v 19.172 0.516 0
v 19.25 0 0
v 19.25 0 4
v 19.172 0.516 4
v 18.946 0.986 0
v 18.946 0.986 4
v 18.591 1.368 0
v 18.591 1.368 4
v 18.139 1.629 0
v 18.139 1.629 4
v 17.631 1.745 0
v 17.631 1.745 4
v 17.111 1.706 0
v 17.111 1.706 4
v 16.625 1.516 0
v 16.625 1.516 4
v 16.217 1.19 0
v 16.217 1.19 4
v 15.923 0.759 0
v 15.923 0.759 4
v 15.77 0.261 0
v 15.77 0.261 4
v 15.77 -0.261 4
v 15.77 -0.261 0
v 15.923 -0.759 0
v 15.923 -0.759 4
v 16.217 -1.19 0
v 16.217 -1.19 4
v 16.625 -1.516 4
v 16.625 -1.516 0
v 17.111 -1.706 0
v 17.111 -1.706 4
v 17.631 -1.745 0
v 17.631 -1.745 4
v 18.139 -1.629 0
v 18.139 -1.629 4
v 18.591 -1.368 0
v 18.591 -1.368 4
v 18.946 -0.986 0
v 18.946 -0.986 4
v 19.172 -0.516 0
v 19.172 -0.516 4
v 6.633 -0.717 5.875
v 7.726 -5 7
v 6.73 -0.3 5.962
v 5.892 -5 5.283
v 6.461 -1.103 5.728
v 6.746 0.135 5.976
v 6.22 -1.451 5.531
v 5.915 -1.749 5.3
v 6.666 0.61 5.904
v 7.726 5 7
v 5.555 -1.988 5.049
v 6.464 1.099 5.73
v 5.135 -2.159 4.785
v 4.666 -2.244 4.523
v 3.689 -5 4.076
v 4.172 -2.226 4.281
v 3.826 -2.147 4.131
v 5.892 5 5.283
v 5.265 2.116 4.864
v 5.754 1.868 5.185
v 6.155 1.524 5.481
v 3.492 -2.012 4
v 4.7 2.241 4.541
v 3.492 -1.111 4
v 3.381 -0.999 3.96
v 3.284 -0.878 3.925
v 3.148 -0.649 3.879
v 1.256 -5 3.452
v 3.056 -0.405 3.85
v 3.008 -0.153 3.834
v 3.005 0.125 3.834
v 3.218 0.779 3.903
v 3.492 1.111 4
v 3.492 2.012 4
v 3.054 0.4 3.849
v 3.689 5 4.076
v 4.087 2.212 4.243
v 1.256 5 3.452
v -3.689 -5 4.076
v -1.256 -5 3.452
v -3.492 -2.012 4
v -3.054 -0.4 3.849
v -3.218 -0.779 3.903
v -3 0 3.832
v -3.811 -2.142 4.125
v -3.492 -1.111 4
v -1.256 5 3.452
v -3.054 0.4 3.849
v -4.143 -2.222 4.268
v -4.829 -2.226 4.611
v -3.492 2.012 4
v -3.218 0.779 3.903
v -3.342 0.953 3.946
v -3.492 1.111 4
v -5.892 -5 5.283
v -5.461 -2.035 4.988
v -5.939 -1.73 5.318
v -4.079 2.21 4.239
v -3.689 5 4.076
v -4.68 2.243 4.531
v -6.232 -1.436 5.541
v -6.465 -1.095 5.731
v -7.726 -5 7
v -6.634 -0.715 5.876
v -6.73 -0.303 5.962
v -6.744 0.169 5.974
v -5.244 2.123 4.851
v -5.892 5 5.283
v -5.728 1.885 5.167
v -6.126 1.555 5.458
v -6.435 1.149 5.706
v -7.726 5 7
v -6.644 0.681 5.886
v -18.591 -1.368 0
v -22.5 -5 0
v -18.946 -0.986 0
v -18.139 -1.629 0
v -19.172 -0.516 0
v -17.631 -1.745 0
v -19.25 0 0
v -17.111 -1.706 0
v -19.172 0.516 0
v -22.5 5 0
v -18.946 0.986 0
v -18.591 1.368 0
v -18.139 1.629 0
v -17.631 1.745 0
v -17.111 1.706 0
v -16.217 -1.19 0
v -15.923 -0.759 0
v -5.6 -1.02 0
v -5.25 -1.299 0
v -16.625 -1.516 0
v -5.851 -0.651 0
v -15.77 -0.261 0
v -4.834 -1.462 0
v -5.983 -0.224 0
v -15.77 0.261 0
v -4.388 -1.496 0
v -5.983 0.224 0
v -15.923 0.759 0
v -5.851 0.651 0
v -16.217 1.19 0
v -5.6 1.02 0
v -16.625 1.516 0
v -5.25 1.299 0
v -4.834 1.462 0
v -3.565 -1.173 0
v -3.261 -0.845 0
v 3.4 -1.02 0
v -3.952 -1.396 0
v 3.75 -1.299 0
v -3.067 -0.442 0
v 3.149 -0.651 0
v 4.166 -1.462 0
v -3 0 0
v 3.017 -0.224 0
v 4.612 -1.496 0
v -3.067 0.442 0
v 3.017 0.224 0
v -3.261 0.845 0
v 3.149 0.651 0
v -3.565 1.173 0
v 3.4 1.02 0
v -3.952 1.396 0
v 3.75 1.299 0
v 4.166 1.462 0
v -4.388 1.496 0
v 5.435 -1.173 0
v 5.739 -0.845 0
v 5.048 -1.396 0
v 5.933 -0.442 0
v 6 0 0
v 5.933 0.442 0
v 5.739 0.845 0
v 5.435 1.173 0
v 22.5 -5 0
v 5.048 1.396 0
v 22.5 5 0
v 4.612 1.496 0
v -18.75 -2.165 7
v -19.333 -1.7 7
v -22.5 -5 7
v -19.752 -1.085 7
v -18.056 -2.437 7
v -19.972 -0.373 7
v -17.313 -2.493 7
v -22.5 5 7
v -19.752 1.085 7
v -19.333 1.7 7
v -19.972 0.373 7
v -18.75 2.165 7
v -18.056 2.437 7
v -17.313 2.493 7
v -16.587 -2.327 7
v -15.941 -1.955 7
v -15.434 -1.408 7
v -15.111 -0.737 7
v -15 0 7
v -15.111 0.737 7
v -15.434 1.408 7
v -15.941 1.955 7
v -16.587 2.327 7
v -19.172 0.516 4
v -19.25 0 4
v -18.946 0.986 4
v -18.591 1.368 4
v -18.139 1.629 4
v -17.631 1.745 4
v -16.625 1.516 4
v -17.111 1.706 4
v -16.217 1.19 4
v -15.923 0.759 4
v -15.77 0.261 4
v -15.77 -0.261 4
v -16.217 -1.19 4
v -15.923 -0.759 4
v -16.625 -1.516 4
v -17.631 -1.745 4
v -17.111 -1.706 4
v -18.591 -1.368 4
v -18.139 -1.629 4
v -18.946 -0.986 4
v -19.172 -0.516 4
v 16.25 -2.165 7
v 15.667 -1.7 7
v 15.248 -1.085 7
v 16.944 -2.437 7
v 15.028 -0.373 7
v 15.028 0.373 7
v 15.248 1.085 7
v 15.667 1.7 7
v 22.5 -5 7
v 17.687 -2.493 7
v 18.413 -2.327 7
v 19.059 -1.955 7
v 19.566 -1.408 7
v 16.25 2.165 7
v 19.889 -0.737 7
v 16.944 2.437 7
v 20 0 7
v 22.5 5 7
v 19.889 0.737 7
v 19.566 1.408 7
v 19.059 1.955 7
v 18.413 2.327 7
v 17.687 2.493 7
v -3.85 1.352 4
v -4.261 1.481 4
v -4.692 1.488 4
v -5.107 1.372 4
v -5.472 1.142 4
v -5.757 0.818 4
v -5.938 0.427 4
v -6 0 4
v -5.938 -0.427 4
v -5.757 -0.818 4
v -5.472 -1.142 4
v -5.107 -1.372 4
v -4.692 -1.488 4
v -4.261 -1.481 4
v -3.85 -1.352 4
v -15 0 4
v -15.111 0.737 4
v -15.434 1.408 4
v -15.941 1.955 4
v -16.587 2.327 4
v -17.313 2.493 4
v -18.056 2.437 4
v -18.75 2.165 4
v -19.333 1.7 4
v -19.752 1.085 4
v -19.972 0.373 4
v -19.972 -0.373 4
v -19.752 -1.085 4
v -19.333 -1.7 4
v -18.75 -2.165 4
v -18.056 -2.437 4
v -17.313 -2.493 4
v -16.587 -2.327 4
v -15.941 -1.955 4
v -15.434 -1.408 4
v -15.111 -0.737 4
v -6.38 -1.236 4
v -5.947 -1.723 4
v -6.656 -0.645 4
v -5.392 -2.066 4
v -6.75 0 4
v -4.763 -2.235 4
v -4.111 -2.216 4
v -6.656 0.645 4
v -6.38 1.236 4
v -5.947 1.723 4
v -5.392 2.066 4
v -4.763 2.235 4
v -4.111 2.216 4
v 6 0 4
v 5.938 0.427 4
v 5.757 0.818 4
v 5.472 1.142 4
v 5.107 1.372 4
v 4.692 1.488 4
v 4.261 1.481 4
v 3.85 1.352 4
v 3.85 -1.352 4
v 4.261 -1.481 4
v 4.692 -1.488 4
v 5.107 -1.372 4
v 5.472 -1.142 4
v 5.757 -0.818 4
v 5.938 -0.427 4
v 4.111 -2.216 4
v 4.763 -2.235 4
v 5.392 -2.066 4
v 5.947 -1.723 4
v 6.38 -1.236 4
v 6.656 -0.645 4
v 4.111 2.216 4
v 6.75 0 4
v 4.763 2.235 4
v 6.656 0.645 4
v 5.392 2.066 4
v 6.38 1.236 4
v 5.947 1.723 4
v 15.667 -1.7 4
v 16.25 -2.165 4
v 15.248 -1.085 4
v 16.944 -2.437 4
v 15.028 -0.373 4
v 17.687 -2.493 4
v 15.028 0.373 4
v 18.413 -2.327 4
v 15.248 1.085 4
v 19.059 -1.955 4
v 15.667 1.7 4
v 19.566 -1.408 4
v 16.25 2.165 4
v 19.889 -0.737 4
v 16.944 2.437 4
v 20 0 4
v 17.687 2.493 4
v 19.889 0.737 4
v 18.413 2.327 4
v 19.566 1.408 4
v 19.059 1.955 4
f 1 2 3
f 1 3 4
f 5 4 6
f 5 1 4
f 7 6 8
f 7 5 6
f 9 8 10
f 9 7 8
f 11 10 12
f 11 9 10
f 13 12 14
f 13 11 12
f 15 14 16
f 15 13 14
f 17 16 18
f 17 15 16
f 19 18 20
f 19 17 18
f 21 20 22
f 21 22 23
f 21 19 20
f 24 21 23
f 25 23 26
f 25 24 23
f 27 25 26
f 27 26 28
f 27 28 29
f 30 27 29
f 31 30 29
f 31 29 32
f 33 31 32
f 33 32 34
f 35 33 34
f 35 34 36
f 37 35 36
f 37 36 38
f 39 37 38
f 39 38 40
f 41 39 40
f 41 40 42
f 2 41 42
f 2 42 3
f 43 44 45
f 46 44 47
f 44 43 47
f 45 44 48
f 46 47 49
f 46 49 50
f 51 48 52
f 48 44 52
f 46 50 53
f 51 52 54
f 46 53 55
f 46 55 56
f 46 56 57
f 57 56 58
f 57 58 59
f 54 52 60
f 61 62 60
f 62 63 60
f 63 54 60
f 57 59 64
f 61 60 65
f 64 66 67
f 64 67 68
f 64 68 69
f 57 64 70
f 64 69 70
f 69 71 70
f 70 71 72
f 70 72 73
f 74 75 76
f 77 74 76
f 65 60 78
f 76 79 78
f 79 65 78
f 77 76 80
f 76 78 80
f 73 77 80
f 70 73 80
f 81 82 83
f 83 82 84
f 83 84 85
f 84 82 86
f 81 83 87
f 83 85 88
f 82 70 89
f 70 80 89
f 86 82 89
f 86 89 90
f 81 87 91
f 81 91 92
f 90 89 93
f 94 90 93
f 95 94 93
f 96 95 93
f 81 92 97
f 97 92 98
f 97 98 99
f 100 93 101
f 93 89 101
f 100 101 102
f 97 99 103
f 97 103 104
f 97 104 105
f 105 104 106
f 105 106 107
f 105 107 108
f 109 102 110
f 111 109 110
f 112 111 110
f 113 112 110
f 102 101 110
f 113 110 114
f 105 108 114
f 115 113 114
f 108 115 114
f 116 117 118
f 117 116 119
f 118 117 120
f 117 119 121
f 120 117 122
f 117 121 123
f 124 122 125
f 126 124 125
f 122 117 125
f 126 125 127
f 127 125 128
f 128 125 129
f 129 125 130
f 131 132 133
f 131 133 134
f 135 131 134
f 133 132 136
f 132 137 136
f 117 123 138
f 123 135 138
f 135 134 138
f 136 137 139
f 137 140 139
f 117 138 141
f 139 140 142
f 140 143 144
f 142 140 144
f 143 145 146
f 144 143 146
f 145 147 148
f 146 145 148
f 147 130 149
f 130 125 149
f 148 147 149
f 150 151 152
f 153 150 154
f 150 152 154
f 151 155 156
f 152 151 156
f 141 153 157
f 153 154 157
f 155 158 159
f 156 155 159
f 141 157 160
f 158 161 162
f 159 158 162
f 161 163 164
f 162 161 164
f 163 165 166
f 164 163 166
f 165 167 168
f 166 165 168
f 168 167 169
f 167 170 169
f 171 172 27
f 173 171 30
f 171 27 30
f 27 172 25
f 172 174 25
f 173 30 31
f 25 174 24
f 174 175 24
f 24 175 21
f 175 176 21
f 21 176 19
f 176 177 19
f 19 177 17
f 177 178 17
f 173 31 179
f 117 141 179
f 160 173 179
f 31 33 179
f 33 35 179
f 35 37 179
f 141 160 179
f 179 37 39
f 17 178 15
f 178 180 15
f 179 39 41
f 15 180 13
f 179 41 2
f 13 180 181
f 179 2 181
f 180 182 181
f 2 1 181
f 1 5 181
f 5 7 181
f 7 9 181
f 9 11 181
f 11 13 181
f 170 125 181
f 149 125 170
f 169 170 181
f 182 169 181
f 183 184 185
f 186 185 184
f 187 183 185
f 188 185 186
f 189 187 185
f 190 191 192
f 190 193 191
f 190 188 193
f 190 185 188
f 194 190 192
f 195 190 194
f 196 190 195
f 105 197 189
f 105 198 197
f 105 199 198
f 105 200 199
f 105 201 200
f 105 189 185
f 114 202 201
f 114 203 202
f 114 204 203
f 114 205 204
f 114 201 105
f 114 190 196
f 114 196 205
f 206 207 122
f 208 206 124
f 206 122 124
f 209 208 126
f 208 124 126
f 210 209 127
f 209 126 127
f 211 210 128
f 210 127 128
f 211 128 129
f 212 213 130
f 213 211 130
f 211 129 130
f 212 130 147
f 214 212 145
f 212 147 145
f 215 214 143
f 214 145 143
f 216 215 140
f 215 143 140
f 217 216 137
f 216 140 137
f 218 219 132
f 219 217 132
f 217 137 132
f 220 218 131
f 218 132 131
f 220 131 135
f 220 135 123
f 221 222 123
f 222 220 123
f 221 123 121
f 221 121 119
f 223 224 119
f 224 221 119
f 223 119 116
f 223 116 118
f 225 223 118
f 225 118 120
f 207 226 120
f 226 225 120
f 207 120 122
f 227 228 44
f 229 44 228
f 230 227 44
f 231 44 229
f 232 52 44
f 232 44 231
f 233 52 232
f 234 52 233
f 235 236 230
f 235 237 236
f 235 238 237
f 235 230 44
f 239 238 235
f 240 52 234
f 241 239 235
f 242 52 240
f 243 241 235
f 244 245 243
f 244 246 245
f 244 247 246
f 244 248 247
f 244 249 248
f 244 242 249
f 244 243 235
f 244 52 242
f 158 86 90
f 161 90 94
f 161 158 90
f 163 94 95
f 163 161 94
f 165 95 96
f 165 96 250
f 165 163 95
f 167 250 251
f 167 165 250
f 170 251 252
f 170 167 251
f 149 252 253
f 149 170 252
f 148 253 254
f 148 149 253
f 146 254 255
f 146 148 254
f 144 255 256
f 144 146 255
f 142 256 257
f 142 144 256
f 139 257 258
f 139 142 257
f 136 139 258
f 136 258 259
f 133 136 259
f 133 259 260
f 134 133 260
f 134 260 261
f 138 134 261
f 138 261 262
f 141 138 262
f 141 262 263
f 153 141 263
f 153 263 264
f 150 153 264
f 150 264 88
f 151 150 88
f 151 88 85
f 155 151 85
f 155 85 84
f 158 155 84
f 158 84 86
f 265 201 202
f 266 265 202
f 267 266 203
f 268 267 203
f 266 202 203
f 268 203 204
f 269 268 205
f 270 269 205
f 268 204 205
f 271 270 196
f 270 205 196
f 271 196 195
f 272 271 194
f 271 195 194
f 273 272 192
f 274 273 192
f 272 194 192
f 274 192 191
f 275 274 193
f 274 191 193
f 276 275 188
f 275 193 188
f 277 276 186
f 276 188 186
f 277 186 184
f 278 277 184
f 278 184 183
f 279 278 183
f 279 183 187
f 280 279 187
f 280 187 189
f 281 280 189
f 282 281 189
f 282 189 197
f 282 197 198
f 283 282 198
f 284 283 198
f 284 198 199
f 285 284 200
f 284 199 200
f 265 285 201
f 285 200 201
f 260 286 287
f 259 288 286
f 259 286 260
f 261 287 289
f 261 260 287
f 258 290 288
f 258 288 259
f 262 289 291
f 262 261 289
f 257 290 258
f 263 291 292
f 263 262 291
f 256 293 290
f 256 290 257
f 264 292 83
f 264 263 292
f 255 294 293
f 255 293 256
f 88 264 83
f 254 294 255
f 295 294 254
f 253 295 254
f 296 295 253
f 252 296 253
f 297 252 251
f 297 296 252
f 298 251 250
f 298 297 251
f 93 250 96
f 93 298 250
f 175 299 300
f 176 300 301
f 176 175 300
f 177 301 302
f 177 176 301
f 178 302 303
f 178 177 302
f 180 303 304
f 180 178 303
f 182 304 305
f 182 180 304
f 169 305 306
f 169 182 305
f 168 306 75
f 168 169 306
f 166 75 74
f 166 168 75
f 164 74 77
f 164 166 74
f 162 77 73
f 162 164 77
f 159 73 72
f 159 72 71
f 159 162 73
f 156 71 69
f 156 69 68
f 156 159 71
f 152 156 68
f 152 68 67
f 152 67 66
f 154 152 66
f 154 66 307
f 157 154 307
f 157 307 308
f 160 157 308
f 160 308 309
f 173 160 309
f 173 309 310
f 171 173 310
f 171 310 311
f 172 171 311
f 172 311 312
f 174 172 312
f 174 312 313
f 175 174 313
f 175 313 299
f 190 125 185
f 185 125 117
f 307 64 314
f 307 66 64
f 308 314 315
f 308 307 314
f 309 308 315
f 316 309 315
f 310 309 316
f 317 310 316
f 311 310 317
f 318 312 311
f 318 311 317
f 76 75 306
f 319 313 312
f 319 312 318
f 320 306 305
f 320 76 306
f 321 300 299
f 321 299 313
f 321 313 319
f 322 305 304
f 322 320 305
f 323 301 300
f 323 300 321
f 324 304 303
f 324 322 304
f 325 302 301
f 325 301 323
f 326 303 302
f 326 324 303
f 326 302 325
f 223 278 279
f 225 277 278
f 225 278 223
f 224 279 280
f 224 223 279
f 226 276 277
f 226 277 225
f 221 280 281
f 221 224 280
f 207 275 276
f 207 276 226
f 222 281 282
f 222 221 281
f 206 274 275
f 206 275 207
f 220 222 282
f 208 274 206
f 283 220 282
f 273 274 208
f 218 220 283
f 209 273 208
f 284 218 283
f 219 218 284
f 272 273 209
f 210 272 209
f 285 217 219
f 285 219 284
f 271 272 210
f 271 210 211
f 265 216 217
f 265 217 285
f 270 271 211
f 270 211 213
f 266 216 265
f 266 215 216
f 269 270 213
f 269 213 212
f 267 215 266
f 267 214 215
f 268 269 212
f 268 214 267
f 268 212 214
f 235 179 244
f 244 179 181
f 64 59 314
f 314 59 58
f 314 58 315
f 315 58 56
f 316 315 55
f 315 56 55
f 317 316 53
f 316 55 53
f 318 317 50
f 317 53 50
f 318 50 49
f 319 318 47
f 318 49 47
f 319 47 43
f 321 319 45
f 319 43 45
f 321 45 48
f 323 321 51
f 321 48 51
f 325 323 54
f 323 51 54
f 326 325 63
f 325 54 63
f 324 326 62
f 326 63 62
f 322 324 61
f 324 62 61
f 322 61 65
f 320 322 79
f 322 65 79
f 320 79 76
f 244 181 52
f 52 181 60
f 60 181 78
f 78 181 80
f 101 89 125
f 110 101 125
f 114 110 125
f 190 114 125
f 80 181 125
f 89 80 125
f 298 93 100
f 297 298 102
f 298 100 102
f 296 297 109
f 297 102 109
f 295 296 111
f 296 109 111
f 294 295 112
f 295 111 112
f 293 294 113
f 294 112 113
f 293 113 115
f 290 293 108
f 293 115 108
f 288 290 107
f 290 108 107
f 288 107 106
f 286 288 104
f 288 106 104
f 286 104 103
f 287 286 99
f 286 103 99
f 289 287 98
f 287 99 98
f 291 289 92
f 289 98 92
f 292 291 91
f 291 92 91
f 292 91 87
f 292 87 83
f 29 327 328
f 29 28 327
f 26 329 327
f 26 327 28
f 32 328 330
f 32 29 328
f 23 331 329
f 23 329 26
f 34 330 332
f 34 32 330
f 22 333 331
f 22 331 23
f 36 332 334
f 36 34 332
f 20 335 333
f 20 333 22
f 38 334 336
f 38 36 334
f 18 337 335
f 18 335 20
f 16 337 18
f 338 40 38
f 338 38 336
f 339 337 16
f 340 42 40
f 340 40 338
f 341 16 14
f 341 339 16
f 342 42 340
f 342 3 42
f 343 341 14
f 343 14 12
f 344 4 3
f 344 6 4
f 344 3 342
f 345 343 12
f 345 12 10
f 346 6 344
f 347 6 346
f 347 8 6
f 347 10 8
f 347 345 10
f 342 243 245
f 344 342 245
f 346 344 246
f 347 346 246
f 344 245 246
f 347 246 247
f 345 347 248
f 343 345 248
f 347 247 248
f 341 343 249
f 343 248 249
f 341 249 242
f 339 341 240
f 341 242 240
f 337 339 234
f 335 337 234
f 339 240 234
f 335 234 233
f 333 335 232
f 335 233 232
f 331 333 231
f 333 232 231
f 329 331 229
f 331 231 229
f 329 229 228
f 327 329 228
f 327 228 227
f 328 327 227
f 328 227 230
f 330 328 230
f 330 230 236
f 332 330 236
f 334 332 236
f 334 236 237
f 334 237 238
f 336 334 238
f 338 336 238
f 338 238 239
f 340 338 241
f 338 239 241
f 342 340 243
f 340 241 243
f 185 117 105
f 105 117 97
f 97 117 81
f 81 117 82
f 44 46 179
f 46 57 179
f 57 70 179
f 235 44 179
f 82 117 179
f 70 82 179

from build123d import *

# Parameters (mm, degrees)
F0_R     = 1.5
F0_R_2   = 1.75
F1_DEPTH = 7
F2_R     = 2.5
F2_R_2   = 1.75
F2_R_3   = 2.25
F2_R_4   = 1.5
F3_DEPTH = 3
F5_DEPTH = 25


with BuildPart() as f1:
    # F0 (on Top) → F1 (new body)
    with BuildSketch(Plane.XY):
        Polygon((22.5, 0), (22.5, 5), (-22.5, 5), (-22.5, 0), (-22.5, -5), (22.5, -5), align=None)
        with BuildLine():
            ThreePointArc((-15.75, 0), (-17.5, -1.75), (-19.25, 0))
            ThreePointArc((-19.25, 0), (-17.5, 1.75), (-15.75, 0))
        make_face(mode=Mode.SUBTRACT)
        with Locations((-4.5, 0)):
            Circle(F0_R, mode=Mode.SUBTRACT)
        with Locations((4.5, 0)):
            Circle(F0_R, mode=Mode.SUBTRACT)
        with Locations((17.5, 0)):
            Circle(F0_R_2, mode=Mode.SUBTRACT)
    extrude(amount=F1_DEPTH)

    # F2 (on face) → F3 (cut)
    with BuildSketch(Plane.XY.offset(7)):
        with Locations((-17.5, 0)):
            Circle(F2_R)
        with Locations((-17.5, 0)):
            Circle(F2_R_2, mode=Mode.SUBTRACT)
        with Locations((-4.5, 0)):
            Circle(F2_R_3)
        with Locations((-4.5, 0)):
            Circle(F2_R_4, mode=Mode.SUBTRACT)
        with Locations((4.5, 0)):
            Circle(F2_R_3)
        with Locations((4.5, 0)):
            Circle(F2_R_4, mode=Mode.SUBTRACT)
        with Locations((17.5, 0)):
            Circle(F2_R)
        with Locations((17.5, 0)):
            Circle(F2_R_2, mode=Mode.SUBTRACT)
    extrude(amount=-F3_DEPTH, mode=Mode.SUBTRACT)

    # F4 (on face) → F5 (cut)
    with BuildSketch(Plane(origin=(0, 5, 0), x_dir=(-1, 0, 0), z_dir=(0, 1, 0))):
        with BuildLine():
            Line((0, 7), (-7.72596329, 7))
            ThreePointArc((-7.72596329, 7), (0, 3.3733951654), (7.72596329, 7))
            Line((7.72596329, 7), (0, 7))
        make_face()
    extrude(amount=-F5_DEPTH, mode=Mode.SUBTRACT)


solid = f1.part
